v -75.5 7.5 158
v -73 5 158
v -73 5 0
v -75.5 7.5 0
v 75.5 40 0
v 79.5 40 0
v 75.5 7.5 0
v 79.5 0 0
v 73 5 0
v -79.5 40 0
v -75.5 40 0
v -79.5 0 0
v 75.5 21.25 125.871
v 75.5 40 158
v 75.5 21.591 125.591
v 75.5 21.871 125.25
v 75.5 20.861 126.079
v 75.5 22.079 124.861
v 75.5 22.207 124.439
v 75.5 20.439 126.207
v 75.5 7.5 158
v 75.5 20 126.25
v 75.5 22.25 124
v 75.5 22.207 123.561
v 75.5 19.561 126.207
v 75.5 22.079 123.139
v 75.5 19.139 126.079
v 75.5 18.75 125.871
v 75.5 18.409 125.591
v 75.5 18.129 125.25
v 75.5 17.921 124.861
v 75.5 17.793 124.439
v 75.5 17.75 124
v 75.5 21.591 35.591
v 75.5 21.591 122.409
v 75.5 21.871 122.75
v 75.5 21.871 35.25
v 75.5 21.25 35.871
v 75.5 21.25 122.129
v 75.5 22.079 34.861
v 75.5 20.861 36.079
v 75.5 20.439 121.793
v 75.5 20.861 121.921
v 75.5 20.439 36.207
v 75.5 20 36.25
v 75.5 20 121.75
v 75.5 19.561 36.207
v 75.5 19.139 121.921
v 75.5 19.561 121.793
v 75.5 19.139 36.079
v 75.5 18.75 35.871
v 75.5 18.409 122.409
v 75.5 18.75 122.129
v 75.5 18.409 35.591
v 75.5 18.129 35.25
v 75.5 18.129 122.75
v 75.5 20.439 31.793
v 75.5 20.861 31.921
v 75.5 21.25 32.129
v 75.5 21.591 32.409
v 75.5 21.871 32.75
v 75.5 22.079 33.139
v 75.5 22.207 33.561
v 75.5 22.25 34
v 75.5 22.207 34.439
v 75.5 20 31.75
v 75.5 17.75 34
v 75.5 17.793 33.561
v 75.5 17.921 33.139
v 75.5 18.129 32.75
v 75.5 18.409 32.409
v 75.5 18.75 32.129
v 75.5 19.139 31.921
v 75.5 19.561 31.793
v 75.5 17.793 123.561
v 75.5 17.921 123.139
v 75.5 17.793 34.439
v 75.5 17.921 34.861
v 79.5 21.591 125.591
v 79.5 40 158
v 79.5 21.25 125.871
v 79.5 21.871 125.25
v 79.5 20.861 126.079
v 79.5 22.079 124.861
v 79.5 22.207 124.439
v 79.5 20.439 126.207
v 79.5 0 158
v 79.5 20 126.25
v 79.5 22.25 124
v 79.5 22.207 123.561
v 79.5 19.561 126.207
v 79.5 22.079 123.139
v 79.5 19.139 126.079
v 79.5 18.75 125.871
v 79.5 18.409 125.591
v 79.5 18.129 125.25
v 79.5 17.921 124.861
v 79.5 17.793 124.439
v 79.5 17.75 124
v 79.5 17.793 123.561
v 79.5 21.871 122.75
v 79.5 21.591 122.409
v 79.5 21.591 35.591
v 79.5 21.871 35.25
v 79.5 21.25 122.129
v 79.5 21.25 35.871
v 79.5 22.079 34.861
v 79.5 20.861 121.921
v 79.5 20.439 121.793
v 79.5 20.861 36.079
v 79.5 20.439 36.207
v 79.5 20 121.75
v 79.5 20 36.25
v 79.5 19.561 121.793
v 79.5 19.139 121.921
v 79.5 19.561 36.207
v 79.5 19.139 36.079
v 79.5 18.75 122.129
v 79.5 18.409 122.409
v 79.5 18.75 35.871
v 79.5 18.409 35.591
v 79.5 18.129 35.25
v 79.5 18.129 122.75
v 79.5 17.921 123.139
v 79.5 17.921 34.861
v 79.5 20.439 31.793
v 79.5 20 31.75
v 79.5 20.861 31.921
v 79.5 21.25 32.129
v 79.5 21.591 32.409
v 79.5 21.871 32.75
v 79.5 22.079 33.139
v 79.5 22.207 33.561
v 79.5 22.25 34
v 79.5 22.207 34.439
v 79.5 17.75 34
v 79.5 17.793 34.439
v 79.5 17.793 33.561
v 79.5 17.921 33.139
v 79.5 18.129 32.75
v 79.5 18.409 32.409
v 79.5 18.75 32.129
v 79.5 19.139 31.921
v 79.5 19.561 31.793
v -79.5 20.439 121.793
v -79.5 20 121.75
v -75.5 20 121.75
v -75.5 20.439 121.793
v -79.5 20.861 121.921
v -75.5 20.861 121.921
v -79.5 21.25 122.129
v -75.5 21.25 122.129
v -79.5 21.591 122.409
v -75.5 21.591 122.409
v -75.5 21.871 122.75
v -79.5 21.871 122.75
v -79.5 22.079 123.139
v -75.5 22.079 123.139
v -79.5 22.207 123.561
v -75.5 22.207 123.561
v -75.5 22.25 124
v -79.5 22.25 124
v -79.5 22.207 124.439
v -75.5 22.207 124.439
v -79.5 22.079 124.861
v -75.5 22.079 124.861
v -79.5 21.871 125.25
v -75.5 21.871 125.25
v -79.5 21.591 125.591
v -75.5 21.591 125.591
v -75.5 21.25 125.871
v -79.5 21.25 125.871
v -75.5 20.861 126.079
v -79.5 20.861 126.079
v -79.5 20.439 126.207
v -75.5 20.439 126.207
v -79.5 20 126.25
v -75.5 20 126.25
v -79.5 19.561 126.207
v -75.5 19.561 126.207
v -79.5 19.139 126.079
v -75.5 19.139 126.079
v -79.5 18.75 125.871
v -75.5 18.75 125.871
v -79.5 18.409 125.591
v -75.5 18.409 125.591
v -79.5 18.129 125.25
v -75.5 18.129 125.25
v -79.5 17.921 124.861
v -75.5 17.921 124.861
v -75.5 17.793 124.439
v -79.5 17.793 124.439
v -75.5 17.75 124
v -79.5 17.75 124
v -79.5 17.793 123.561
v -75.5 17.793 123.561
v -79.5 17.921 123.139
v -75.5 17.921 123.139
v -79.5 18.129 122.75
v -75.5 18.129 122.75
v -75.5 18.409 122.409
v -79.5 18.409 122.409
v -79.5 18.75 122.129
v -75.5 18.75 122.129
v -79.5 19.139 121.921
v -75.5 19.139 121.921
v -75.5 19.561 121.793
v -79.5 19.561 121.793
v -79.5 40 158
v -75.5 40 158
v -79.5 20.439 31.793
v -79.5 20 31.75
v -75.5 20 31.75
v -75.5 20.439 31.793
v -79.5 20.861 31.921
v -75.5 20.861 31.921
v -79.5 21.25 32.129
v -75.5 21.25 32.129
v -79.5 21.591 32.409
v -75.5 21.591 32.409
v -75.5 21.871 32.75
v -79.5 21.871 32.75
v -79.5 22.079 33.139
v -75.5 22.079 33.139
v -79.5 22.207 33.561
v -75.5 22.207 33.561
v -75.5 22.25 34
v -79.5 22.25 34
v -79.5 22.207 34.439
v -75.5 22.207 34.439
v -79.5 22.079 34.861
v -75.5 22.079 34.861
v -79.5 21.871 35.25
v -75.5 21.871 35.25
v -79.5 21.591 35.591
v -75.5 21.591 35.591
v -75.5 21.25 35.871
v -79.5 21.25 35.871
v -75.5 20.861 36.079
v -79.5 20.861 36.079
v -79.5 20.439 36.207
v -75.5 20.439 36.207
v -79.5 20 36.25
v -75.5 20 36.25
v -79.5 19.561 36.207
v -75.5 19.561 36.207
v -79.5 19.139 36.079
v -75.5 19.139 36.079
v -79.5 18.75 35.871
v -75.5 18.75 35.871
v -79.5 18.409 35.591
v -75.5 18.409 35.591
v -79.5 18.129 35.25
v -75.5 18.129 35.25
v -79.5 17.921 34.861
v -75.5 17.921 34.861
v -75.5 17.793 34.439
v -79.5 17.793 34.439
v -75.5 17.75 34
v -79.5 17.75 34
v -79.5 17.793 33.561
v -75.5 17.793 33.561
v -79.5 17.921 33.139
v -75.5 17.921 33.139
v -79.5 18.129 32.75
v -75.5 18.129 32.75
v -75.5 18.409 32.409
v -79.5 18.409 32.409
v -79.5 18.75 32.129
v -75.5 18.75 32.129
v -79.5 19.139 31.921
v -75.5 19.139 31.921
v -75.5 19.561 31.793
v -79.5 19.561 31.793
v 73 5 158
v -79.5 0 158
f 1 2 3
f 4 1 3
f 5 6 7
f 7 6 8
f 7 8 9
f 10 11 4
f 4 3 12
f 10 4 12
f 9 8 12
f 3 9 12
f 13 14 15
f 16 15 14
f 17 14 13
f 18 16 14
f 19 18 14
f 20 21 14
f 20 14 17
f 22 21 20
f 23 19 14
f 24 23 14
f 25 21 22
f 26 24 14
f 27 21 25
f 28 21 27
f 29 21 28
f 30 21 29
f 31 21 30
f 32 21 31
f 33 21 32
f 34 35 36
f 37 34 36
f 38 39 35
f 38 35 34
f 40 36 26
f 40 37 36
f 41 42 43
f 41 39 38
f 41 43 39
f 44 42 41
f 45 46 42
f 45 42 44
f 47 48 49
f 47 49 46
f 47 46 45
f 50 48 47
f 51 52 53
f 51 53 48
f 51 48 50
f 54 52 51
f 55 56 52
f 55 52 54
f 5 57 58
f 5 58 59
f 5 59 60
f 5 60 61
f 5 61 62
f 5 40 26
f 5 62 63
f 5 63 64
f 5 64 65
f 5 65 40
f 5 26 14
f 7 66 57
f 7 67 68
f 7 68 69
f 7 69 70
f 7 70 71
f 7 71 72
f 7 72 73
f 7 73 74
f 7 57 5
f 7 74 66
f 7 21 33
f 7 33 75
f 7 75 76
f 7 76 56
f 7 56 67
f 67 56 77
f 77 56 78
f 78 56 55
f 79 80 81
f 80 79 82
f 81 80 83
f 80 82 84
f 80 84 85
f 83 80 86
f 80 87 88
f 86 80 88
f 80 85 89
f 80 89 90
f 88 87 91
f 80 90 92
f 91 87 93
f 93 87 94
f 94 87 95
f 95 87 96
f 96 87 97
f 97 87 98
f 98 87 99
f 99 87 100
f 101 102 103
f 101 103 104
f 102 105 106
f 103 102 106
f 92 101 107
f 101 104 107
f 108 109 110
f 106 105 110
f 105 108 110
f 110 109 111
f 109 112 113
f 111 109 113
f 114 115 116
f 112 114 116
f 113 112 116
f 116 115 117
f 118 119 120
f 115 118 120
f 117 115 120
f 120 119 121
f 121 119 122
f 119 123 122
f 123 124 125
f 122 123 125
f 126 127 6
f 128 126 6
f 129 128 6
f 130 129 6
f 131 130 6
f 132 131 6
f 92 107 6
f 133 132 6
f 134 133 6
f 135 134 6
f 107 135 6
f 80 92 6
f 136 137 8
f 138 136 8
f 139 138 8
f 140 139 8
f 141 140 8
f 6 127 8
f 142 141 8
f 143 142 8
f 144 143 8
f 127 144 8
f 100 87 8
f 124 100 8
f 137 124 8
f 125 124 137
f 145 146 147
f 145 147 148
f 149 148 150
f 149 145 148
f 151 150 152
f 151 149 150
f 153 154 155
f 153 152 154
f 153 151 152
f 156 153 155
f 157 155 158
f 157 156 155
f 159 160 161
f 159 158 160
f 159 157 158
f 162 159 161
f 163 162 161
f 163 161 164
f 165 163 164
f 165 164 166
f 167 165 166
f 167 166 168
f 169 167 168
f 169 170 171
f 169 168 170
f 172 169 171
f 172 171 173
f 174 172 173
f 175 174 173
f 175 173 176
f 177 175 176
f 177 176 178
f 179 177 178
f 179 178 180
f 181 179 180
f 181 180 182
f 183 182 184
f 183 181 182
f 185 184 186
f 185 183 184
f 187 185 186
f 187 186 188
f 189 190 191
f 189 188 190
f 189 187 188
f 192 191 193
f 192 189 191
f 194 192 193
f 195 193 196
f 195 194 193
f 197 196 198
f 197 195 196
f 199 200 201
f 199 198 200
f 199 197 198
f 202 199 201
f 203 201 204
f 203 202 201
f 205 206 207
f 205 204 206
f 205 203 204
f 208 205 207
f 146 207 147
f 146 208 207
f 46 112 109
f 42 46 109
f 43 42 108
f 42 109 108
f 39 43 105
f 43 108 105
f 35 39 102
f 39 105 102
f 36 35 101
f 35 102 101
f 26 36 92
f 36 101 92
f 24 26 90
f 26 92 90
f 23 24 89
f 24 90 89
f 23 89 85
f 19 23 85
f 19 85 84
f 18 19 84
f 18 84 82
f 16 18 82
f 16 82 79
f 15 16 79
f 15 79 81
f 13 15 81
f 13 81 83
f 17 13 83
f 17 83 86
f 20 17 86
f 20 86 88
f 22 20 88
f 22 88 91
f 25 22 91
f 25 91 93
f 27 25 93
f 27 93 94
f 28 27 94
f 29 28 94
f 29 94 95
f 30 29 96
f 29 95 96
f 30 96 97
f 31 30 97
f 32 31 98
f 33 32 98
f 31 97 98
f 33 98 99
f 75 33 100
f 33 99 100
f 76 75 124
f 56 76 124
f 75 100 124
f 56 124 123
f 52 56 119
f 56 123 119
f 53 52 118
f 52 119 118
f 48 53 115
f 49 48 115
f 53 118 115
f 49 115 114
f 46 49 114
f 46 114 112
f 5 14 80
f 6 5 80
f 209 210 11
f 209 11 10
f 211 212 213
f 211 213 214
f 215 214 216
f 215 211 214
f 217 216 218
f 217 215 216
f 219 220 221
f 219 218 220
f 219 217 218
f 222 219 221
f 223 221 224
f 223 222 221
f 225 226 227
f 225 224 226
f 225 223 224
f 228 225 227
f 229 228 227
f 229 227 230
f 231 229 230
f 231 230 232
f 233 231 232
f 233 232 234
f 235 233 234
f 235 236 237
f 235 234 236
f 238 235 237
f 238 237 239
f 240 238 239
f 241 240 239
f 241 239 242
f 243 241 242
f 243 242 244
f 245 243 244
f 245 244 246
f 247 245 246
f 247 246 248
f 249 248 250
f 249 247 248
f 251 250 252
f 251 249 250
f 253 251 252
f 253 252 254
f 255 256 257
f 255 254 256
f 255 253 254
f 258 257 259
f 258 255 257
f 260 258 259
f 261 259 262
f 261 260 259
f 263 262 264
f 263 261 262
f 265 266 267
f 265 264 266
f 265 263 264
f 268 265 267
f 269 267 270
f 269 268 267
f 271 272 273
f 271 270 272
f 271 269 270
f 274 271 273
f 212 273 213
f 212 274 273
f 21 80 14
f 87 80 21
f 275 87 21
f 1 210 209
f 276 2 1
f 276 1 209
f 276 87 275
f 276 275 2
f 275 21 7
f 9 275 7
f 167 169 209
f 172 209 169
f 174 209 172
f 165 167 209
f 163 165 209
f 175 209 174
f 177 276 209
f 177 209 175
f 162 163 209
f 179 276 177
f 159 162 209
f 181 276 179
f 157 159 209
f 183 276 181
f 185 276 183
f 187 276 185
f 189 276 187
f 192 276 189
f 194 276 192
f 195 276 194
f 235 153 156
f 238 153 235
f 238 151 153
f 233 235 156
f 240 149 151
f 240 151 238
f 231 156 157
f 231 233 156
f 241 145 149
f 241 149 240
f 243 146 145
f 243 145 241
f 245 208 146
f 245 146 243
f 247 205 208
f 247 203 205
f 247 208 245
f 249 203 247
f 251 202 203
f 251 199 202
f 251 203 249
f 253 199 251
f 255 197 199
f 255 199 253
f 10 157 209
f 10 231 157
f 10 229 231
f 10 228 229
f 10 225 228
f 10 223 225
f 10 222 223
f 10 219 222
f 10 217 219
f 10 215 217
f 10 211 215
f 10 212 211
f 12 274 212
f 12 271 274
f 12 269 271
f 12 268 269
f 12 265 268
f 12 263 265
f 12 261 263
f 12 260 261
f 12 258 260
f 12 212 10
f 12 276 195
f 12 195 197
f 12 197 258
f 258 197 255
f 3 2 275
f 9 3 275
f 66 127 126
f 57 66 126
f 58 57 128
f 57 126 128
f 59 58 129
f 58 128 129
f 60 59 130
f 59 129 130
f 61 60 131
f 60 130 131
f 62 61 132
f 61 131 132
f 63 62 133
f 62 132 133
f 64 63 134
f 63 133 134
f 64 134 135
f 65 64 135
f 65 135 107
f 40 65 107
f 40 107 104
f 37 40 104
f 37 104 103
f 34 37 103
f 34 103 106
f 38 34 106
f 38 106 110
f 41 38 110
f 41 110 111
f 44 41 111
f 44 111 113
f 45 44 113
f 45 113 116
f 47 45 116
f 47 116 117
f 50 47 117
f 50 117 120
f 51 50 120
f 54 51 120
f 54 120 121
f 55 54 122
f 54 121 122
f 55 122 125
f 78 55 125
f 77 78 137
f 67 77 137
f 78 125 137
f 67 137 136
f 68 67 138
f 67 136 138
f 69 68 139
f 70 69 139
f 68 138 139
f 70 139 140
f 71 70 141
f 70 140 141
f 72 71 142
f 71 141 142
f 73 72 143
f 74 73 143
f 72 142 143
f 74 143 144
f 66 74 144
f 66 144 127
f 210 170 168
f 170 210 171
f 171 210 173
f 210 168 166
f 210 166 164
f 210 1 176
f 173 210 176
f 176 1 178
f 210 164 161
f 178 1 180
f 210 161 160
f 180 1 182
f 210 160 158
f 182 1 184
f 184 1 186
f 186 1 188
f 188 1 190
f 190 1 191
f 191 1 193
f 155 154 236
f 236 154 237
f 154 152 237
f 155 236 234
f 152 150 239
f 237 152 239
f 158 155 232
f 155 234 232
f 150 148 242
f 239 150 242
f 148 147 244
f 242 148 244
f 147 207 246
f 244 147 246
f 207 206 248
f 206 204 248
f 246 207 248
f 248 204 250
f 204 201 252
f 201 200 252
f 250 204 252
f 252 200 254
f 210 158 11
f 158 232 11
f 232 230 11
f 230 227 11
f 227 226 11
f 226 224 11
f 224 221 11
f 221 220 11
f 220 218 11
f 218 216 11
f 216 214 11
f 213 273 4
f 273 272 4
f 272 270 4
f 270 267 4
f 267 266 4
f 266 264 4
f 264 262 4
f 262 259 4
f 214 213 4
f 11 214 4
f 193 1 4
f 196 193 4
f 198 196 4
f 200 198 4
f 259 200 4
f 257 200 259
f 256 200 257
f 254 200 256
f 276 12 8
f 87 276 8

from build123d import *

# Parameters (mm, degrees)
SKETCH1_W            = 159
SKETCH1_H            = 158
BOSS_EXTRUDE1_DEPTH  = 5
SKETCH4_W            = 4
SKETCH4_H            = 158
BOSS_EXTRUDE2_DEPTH  = 35
M4_CLEARANCE_HOLE1_D = 4.5
CHAMFER2_SIZE        = 2.5


with BuildPart() as part:
    # Sketch1 → Boss-Extrude1 (new body)
    with BuildSketch(Plane(origin=(0, 0, 0), x_dir=(1, 0, 0), z_dir=(0, 1, 0))):
        with Locations((0, -79)):
            Rectangle(SKETCH1_W, SKETCH1_H)
    extrude(amount=BOSS_EXTRUDE1_DEPTH)

    # Sketch4 → Boss-Extrude2 (add)
    with BuildSketch(Plane(origin=(0, 5, 0), x_dir=(1, 0, 0), z_dir=(0, 1, 0))):
        with Locations((77.5, -79)):
            Rectangle(SKETCH4_W, SKETCH4_H)
    boss_extrude2 = extrude(amount=BOSS_EXTRUDE2_DEPTH)

    # M4 Clearance Hole1 (through all)
    with Locations(Plane.ZY.offset(-75.5)):
        with Locations((124, 20), (34, 20)):
            m4_clearance_hole1 = Hole(M4_CLEARANCE_HOLE1_D / 2)

    # Mirror2: Boss-Extrude2, M4 Clearance Hole1 across plane
    add(boss_extrude2.mirror(Plane.ZY))
    add(m4_clearance_hole1.mirror(Plane.ZY), mode=Mode.SUBTRACT)

    # Chamfer2
    chamfer2_edges = [part.edges().sort_by_distance(p)[0] for p in [
        (75.5, 5, 79),
        (-75.5, 5, 79),
    ]]
    chamfer(chamfer2_edges, length=CHAMFER2_SIZE)


solid = part.part
